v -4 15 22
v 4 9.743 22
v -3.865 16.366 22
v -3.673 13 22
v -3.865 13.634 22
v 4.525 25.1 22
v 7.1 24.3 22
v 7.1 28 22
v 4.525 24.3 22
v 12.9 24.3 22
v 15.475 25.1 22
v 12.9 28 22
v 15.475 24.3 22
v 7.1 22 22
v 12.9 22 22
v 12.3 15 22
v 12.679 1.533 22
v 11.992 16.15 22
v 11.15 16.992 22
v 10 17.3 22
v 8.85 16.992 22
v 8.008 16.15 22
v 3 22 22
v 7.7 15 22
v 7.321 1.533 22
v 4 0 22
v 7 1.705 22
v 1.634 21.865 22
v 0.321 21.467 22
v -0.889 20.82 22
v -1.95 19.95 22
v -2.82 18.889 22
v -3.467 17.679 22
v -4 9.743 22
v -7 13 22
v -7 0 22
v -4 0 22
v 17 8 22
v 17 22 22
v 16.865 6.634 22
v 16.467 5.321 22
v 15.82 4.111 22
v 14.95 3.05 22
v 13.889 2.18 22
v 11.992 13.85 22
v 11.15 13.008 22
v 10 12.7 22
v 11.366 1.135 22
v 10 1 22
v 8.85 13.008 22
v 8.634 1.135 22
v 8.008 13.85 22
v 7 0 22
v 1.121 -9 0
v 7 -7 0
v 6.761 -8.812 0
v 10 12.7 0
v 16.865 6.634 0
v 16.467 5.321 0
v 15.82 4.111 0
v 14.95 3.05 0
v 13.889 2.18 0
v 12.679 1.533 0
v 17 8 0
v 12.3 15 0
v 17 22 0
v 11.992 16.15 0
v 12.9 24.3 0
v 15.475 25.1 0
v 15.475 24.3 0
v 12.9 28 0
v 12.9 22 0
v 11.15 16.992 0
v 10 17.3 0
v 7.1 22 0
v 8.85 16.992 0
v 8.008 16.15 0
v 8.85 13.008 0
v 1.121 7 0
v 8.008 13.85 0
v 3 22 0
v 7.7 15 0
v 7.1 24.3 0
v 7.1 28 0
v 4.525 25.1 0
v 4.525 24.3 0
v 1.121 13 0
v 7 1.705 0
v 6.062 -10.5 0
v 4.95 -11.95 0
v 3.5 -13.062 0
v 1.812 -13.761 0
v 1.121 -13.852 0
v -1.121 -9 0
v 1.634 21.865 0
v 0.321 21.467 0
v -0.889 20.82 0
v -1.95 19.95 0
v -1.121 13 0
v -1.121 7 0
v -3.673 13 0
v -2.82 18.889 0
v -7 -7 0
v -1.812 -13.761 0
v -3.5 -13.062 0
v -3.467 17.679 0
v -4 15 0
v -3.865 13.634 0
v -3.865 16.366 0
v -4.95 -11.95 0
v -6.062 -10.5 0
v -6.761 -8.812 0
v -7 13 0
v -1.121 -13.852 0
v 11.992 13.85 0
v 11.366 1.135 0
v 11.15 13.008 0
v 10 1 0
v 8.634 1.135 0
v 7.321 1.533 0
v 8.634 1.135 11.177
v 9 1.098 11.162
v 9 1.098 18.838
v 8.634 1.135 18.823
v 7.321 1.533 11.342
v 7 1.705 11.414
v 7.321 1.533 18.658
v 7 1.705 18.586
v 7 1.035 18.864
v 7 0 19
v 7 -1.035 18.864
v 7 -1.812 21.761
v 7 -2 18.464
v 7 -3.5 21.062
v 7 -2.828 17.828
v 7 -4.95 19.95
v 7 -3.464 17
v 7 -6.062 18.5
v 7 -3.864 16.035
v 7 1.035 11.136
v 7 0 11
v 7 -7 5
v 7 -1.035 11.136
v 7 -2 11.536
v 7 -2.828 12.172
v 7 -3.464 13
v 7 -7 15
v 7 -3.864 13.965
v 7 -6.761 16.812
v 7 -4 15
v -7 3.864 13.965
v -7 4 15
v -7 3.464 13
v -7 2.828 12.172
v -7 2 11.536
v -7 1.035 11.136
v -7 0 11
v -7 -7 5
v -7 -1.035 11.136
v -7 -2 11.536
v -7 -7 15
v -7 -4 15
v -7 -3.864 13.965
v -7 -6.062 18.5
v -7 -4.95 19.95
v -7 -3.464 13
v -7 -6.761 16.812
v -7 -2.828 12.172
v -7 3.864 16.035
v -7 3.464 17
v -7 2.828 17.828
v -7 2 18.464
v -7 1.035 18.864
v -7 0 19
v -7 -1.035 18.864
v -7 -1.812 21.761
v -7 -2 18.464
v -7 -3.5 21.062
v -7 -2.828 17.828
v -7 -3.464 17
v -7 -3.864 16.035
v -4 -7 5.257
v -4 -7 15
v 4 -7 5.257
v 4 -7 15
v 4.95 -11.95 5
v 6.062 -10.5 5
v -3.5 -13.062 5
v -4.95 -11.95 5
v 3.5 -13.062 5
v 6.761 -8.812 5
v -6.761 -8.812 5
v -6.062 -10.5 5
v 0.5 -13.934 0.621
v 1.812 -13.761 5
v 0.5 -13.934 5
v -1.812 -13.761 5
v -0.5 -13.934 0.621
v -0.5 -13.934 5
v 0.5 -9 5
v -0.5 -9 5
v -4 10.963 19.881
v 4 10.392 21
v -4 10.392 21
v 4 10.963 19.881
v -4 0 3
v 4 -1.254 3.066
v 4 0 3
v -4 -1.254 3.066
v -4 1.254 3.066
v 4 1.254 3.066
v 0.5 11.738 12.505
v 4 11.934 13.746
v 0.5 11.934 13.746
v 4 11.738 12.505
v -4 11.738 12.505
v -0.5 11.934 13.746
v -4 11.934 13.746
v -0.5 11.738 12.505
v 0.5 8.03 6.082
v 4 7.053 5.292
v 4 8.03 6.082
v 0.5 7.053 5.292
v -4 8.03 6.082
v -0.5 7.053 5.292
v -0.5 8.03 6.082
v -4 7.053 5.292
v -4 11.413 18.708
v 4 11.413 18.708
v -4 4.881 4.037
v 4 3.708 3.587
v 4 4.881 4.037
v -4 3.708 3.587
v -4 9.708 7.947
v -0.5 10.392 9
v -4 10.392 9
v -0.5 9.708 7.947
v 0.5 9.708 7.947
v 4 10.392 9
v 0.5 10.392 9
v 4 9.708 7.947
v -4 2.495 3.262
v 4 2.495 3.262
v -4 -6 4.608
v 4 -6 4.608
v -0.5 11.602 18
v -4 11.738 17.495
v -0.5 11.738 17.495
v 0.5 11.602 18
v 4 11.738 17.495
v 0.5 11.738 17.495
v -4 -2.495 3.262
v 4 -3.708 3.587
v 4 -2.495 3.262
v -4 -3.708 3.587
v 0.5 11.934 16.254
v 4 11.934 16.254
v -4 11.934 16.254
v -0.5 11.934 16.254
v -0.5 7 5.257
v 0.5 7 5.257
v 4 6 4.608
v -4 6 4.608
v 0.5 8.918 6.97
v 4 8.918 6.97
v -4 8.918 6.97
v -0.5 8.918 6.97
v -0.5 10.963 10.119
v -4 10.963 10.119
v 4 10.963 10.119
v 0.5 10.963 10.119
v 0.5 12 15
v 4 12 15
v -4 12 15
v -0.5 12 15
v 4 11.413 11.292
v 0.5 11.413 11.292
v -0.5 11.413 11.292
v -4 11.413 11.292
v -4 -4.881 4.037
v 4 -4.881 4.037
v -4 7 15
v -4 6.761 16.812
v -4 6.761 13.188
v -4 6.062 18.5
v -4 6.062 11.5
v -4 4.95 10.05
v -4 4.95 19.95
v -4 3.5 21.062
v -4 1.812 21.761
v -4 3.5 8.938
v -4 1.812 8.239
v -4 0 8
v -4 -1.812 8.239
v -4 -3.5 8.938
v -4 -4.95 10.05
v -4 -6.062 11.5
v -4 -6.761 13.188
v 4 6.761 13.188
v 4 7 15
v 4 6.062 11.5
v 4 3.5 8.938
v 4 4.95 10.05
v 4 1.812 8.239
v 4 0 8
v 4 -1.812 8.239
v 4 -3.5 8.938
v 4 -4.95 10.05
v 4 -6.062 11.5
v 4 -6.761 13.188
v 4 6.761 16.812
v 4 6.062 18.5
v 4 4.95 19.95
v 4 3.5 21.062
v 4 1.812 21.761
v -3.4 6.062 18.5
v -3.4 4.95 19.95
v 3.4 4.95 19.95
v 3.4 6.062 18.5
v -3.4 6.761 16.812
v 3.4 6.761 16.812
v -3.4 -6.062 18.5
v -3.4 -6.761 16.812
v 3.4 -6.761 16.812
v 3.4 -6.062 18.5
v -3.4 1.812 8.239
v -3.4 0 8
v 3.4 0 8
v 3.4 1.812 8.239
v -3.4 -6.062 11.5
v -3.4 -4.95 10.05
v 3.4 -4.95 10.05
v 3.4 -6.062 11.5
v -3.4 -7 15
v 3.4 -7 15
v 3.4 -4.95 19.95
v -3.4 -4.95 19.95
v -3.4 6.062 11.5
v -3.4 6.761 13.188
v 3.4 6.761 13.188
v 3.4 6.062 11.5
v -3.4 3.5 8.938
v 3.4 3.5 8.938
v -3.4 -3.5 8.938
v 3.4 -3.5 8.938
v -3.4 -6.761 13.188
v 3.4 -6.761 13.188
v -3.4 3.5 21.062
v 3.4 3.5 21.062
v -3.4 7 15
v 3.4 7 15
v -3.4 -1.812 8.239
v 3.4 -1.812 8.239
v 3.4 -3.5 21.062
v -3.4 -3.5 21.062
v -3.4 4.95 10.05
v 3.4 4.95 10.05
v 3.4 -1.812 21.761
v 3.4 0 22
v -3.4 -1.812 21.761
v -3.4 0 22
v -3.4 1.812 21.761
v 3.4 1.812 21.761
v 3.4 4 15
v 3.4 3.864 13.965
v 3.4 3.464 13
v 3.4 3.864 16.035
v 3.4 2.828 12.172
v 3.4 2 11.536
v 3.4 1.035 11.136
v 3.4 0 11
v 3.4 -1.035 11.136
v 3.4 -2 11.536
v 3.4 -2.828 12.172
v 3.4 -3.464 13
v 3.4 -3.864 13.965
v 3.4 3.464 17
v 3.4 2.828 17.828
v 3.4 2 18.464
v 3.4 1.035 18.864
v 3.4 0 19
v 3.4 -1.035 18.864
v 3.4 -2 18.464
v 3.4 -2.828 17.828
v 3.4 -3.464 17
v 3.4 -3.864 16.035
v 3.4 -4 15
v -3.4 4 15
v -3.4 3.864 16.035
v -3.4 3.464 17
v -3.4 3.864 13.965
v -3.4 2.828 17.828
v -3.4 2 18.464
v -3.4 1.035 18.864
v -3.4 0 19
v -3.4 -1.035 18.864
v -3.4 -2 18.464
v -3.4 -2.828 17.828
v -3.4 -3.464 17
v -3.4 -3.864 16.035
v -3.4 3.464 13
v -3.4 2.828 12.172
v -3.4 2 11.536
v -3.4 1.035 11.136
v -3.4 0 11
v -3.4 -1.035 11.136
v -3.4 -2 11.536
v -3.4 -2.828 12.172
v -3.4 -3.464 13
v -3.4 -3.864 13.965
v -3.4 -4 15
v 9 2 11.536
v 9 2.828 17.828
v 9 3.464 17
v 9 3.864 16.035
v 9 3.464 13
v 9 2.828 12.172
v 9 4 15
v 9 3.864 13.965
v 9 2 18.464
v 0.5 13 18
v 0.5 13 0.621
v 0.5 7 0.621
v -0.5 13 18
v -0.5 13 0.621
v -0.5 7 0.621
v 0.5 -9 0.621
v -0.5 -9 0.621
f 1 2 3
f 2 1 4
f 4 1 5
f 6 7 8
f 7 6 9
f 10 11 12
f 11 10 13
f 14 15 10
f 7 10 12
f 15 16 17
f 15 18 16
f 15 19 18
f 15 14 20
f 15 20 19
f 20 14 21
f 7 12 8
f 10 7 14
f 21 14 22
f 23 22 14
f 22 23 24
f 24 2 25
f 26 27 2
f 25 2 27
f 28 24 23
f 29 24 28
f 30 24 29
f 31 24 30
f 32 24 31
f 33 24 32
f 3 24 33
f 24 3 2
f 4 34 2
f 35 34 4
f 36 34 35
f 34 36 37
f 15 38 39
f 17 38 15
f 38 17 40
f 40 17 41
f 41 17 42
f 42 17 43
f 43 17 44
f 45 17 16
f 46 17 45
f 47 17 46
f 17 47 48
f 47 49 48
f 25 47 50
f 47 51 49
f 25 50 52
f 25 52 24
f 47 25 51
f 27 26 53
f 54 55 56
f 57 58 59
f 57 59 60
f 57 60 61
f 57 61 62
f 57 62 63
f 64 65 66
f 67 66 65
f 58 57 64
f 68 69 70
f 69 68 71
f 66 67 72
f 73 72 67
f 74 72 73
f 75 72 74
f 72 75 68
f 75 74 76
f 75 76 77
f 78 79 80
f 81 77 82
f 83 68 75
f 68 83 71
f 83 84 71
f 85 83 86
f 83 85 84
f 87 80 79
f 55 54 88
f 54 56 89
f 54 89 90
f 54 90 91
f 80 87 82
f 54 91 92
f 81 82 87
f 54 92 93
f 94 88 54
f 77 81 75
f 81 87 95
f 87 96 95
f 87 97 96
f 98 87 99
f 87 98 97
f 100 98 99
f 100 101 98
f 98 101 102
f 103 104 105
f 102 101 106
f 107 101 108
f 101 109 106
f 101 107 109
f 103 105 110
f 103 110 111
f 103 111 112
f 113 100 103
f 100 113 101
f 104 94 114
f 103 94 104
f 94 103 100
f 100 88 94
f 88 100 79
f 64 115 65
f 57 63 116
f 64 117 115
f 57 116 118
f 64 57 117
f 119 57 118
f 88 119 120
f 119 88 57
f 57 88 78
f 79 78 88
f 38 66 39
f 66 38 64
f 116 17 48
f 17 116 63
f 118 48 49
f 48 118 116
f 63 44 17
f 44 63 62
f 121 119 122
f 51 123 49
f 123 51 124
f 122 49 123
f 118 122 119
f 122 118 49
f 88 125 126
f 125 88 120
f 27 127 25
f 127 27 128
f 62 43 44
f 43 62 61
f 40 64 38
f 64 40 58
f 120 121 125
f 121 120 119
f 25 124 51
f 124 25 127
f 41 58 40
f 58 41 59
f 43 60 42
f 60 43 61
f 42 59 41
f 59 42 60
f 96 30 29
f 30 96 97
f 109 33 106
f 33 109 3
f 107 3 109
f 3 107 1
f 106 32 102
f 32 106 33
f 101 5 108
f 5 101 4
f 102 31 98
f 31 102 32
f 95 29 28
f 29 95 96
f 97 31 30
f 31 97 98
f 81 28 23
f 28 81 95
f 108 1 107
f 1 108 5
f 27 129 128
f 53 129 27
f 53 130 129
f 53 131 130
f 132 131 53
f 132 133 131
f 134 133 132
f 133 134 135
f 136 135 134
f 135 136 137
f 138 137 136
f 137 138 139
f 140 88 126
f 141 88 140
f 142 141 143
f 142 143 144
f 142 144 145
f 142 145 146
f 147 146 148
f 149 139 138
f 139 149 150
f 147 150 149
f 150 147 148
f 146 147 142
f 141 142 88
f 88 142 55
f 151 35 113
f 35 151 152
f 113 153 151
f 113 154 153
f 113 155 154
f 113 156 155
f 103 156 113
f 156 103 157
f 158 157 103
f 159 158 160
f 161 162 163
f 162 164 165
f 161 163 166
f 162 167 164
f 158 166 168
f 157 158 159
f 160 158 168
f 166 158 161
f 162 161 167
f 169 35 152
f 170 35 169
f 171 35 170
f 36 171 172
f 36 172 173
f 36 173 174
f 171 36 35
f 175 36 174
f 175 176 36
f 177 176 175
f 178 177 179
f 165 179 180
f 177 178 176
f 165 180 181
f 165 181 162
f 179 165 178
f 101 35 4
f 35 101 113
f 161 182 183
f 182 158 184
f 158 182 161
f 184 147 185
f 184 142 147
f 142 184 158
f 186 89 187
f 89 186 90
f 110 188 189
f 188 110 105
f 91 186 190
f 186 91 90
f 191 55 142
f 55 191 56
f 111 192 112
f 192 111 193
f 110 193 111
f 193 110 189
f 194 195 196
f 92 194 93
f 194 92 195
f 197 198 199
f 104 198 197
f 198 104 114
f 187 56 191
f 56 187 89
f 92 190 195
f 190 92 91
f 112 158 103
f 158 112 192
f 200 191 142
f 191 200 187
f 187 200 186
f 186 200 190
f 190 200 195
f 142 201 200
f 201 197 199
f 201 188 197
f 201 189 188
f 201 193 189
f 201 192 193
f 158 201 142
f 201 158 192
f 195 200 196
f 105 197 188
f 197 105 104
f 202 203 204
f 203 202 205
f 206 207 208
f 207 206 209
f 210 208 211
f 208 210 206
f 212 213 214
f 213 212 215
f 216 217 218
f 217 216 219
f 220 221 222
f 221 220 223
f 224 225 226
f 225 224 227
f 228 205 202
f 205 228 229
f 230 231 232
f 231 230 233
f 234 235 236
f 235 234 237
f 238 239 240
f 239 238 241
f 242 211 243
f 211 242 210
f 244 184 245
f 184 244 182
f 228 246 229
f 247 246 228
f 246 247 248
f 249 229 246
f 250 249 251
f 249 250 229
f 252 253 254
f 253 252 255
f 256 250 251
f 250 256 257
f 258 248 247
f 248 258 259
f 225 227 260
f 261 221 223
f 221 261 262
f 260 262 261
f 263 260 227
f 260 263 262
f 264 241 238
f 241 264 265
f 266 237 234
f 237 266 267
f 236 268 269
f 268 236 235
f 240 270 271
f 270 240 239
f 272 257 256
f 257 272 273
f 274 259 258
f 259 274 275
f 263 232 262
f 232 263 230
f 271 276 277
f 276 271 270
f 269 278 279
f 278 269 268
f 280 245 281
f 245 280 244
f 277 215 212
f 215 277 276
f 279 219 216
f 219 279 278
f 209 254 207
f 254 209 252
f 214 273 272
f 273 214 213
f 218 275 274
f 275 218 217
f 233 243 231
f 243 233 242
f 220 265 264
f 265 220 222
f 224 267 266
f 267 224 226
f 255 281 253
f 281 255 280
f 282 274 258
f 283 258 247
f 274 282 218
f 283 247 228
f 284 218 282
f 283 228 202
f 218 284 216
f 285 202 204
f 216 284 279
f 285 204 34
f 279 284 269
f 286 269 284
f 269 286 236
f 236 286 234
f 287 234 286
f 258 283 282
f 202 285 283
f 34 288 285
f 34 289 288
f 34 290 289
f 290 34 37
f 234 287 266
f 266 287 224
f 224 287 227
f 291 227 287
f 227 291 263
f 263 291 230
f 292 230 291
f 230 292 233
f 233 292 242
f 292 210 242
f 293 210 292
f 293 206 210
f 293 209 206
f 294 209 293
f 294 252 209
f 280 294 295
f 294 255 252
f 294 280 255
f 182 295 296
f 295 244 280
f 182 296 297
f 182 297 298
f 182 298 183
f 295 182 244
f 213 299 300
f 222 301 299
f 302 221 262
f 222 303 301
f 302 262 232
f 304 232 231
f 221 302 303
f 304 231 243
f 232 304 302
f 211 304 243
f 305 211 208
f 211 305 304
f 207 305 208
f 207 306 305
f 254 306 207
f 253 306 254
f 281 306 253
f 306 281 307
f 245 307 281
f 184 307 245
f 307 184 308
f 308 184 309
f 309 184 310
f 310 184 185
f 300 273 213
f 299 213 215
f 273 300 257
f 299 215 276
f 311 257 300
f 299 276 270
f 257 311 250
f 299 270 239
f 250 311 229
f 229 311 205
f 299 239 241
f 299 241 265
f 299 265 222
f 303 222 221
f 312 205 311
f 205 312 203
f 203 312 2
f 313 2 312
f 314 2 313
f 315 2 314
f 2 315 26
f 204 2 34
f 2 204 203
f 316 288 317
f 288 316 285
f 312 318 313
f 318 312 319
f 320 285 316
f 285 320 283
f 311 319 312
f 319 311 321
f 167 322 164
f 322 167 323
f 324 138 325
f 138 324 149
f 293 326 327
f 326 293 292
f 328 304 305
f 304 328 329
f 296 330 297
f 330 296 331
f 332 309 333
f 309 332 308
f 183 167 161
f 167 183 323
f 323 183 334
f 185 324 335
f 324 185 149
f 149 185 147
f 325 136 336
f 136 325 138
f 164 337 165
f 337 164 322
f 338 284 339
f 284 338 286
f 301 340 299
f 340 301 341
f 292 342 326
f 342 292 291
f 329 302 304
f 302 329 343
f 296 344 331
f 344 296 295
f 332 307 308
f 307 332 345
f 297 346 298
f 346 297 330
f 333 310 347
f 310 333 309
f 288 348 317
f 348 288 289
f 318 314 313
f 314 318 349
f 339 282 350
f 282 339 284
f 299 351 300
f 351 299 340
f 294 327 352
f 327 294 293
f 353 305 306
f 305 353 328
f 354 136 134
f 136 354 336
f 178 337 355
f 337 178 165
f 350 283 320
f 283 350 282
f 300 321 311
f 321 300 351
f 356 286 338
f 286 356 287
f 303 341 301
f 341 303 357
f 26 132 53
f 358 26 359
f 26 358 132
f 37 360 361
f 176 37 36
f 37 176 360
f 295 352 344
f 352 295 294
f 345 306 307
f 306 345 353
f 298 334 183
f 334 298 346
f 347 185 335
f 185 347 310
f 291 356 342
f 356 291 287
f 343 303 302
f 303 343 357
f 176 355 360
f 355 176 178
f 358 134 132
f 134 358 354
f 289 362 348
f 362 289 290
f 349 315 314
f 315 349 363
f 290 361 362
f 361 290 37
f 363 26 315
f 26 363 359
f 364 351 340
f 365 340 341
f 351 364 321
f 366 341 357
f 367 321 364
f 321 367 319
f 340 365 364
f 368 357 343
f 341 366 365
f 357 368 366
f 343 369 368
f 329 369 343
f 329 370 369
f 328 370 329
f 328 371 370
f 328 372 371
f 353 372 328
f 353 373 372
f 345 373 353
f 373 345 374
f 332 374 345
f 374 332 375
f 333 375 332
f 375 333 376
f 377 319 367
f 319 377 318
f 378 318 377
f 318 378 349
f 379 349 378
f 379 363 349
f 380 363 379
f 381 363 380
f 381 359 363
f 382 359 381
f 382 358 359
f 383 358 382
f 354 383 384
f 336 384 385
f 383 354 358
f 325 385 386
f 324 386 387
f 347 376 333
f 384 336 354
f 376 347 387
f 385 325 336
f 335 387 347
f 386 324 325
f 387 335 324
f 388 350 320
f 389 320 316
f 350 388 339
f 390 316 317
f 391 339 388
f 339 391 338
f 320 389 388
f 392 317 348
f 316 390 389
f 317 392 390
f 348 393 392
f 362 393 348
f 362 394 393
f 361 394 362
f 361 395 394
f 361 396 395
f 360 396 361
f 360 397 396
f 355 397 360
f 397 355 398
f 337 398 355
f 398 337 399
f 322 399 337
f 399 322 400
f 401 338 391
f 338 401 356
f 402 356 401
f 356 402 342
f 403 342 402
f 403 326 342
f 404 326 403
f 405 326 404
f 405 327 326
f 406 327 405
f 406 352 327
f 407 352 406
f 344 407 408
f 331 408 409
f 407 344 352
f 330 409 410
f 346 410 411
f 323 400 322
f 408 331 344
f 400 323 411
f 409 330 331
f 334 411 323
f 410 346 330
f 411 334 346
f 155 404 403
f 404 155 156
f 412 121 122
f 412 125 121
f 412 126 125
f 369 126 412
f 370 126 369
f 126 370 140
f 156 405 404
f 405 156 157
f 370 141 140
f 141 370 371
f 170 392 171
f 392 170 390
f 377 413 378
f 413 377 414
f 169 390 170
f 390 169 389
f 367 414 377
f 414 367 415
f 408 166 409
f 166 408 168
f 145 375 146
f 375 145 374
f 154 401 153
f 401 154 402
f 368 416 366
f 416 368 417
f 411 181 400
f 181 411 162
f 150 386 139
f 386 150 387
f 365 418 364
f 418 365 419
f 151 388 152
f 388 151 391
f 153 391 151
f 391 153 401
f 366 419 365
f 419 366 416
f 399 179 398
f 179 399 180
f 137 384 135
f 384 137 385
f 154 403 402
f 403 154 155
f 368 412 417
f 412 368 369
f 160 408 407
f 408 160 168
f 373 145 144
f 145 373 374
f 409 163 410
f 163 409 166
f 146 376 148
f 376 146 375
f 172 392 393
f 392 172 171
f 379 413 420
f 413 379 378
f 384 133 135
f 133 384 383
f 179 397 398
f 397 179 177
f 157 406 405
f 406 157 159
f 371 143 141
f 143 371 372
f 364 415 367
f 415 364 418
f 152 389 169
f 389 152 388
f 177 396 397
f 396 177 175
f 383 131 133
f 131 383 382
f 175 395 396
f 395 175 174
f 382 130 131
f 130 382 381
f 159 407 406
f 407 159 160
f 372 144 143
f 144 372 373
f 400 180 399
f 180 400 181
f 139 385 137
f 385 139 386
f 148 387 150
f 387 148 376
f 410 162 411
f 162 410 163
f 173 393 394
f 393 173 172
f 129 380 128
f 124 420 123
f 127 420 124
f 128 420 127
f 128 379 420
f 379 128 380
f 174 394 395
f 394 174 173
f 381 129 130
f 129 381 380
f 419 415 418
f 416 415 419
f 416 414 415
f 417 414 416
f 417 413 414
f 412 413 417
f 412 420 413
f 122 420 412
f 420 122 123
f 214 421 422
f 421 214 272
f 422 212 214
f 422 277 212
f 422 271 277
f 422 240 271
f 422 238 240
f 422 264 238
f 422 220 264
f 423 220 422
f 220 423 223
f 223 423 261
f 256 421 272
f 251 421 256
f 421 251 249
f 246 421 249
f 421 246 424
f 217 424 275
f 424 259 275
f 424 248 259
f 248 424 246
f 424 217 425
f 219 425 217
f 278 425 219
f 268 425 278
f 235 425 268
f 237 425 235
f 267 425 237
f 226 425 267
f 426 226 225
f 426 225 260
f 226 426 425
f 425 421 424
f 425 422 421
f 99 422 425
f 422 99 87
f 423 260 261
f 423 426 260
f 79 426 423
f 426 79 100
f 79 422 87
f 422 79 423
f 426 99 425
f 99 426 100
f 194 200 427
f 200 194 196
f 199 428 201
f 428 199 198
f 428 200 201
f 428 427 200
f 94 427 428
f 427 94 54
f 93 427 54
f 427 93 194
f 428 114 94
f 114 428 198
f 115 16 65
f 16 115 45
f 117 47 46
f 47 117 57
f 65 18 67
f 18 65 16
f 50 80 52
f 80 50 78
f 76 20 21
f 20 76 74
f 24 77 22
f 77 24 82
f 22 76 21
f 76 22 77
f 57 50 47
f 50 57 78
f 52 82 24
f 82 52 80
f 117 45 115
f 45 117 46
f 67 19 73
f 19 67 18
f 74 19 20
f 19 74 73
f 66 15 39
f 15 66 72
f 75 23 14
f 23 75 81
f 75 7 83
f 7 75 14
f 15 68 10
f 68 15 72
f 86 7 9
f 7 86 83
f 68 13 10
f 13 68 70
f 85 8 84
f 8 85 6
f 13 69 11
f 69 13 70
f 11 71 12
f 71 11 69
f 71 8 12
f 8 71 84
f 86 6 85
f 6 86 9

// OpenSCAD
// file: 2020-insert.scad
slotneckw= 6-0.2;
slotthick= 2+0.3;
slotdepth= 3.2+0.6-0.1;
slotwidth= 9.95+1.0;
shoulder=0.8;
edge= (slotwidth-slotneckw)/2;
diagl=3.6;

p1= [0,0];
p2= [slotwidth,0];
p3= [slotwidth,-shoulder];
p4= [slotwidth-edge,-slotdepth];
p5= [edge,-slotdepth];
p6= [0,-shoulder];
p7= [0,0];

module slider_body(width, height, thick) {
	union() {
		translate([-width/2,slotthick,0]) cube([width,thick,height]);
		translate([-slotneckw/2,0,0]) cube([slotneckw, slotthick, height]);
		translate([-slotwidth/2,0,0]) linear_extrude(height=height)
			polygon(points=[ p1,p2,p3,p4,p5,p6,p7 ]);
	}
}

module slider2020(w= 20, h= 20, t=2) {
	translate([0,-slotthick,0]) slider_body(w, h, t);
}

slider2020(w=10, h=10, t=2);
// main file
use <2020-insert.scad>

// sideways
// offset_x = -15;
// offset_y = 10;
// rotate_z = 0;

// front
offset_x = -15;
offset_y = 10;
rotate_z = -90;

module tensioner_body() {
	difference() {
		union() {
			difference() {
				union() {
					rotate([0, 0, rotate_z]) translate([offset_x, offset_y, -4]) {
						cube([14, 14, 22], center=true);
						translate([7, 0, 0]) cylinder(r=7, h=22, center=true, $fn=32);
						translate([0, -7, 0]) cylinder(r=7, h=22, center=true, $fn=32);
					}
					translate([0, 3, -4]) cube([14, 20, 22], center=true);
					translate([0, -7, -12.5]) cylinder(r=7, h=5, center=true, $fn=24);
				}
				translate([0, -11, 11]) cube([18, 22, 22], center=true);
				rotate([0, 90, 0]) cylinder(r=12, h=8, center=true, $fn=60);
			}
			rotate([0, 90, 0]) cylinder(r=7, h=14, center=true, $fn=24);
		}
		rotate([0, 90, 0]) {
			cylinder(r=11, h=6.8, center=true);
			cylinder(r=4, h=18, center=true, $fn=24);
		}
		for (y = [10, -12]) {
			translate([0, y, -7]) cube([1, 6, 20], center=true);
			translate([0, y, -16]) rotate([0, 45, 0]) cube([3, 6, 3], center=true);
		}
		rotate([0, 0, rotate_z]) translate([offset_x, offset_y, -4]) {
			// 1/4" hole for tensioner
			#cylinder(r=(4)/2+0.3, h=50, center=true, $fn=12);
		}
	}
}

module tensioner_608() {
	union() {
		translate([0, 0, 15]) tensioner_body();
		//translate([-23,10,0]) rotate([0,0,-90]) slider2020(h=22, w=14, t=2);
		translate([offset_y,offset_y+14-2,0]) rotate([0,0,180]) slider2020(h=22, w=14, t=2);
	}
}

function tensioner_height()= 22;

tensioner_608();
% translate([0, 0, 15]) rotate([0, 90, 0]) cylinder(r=11, h=7, center=true);
